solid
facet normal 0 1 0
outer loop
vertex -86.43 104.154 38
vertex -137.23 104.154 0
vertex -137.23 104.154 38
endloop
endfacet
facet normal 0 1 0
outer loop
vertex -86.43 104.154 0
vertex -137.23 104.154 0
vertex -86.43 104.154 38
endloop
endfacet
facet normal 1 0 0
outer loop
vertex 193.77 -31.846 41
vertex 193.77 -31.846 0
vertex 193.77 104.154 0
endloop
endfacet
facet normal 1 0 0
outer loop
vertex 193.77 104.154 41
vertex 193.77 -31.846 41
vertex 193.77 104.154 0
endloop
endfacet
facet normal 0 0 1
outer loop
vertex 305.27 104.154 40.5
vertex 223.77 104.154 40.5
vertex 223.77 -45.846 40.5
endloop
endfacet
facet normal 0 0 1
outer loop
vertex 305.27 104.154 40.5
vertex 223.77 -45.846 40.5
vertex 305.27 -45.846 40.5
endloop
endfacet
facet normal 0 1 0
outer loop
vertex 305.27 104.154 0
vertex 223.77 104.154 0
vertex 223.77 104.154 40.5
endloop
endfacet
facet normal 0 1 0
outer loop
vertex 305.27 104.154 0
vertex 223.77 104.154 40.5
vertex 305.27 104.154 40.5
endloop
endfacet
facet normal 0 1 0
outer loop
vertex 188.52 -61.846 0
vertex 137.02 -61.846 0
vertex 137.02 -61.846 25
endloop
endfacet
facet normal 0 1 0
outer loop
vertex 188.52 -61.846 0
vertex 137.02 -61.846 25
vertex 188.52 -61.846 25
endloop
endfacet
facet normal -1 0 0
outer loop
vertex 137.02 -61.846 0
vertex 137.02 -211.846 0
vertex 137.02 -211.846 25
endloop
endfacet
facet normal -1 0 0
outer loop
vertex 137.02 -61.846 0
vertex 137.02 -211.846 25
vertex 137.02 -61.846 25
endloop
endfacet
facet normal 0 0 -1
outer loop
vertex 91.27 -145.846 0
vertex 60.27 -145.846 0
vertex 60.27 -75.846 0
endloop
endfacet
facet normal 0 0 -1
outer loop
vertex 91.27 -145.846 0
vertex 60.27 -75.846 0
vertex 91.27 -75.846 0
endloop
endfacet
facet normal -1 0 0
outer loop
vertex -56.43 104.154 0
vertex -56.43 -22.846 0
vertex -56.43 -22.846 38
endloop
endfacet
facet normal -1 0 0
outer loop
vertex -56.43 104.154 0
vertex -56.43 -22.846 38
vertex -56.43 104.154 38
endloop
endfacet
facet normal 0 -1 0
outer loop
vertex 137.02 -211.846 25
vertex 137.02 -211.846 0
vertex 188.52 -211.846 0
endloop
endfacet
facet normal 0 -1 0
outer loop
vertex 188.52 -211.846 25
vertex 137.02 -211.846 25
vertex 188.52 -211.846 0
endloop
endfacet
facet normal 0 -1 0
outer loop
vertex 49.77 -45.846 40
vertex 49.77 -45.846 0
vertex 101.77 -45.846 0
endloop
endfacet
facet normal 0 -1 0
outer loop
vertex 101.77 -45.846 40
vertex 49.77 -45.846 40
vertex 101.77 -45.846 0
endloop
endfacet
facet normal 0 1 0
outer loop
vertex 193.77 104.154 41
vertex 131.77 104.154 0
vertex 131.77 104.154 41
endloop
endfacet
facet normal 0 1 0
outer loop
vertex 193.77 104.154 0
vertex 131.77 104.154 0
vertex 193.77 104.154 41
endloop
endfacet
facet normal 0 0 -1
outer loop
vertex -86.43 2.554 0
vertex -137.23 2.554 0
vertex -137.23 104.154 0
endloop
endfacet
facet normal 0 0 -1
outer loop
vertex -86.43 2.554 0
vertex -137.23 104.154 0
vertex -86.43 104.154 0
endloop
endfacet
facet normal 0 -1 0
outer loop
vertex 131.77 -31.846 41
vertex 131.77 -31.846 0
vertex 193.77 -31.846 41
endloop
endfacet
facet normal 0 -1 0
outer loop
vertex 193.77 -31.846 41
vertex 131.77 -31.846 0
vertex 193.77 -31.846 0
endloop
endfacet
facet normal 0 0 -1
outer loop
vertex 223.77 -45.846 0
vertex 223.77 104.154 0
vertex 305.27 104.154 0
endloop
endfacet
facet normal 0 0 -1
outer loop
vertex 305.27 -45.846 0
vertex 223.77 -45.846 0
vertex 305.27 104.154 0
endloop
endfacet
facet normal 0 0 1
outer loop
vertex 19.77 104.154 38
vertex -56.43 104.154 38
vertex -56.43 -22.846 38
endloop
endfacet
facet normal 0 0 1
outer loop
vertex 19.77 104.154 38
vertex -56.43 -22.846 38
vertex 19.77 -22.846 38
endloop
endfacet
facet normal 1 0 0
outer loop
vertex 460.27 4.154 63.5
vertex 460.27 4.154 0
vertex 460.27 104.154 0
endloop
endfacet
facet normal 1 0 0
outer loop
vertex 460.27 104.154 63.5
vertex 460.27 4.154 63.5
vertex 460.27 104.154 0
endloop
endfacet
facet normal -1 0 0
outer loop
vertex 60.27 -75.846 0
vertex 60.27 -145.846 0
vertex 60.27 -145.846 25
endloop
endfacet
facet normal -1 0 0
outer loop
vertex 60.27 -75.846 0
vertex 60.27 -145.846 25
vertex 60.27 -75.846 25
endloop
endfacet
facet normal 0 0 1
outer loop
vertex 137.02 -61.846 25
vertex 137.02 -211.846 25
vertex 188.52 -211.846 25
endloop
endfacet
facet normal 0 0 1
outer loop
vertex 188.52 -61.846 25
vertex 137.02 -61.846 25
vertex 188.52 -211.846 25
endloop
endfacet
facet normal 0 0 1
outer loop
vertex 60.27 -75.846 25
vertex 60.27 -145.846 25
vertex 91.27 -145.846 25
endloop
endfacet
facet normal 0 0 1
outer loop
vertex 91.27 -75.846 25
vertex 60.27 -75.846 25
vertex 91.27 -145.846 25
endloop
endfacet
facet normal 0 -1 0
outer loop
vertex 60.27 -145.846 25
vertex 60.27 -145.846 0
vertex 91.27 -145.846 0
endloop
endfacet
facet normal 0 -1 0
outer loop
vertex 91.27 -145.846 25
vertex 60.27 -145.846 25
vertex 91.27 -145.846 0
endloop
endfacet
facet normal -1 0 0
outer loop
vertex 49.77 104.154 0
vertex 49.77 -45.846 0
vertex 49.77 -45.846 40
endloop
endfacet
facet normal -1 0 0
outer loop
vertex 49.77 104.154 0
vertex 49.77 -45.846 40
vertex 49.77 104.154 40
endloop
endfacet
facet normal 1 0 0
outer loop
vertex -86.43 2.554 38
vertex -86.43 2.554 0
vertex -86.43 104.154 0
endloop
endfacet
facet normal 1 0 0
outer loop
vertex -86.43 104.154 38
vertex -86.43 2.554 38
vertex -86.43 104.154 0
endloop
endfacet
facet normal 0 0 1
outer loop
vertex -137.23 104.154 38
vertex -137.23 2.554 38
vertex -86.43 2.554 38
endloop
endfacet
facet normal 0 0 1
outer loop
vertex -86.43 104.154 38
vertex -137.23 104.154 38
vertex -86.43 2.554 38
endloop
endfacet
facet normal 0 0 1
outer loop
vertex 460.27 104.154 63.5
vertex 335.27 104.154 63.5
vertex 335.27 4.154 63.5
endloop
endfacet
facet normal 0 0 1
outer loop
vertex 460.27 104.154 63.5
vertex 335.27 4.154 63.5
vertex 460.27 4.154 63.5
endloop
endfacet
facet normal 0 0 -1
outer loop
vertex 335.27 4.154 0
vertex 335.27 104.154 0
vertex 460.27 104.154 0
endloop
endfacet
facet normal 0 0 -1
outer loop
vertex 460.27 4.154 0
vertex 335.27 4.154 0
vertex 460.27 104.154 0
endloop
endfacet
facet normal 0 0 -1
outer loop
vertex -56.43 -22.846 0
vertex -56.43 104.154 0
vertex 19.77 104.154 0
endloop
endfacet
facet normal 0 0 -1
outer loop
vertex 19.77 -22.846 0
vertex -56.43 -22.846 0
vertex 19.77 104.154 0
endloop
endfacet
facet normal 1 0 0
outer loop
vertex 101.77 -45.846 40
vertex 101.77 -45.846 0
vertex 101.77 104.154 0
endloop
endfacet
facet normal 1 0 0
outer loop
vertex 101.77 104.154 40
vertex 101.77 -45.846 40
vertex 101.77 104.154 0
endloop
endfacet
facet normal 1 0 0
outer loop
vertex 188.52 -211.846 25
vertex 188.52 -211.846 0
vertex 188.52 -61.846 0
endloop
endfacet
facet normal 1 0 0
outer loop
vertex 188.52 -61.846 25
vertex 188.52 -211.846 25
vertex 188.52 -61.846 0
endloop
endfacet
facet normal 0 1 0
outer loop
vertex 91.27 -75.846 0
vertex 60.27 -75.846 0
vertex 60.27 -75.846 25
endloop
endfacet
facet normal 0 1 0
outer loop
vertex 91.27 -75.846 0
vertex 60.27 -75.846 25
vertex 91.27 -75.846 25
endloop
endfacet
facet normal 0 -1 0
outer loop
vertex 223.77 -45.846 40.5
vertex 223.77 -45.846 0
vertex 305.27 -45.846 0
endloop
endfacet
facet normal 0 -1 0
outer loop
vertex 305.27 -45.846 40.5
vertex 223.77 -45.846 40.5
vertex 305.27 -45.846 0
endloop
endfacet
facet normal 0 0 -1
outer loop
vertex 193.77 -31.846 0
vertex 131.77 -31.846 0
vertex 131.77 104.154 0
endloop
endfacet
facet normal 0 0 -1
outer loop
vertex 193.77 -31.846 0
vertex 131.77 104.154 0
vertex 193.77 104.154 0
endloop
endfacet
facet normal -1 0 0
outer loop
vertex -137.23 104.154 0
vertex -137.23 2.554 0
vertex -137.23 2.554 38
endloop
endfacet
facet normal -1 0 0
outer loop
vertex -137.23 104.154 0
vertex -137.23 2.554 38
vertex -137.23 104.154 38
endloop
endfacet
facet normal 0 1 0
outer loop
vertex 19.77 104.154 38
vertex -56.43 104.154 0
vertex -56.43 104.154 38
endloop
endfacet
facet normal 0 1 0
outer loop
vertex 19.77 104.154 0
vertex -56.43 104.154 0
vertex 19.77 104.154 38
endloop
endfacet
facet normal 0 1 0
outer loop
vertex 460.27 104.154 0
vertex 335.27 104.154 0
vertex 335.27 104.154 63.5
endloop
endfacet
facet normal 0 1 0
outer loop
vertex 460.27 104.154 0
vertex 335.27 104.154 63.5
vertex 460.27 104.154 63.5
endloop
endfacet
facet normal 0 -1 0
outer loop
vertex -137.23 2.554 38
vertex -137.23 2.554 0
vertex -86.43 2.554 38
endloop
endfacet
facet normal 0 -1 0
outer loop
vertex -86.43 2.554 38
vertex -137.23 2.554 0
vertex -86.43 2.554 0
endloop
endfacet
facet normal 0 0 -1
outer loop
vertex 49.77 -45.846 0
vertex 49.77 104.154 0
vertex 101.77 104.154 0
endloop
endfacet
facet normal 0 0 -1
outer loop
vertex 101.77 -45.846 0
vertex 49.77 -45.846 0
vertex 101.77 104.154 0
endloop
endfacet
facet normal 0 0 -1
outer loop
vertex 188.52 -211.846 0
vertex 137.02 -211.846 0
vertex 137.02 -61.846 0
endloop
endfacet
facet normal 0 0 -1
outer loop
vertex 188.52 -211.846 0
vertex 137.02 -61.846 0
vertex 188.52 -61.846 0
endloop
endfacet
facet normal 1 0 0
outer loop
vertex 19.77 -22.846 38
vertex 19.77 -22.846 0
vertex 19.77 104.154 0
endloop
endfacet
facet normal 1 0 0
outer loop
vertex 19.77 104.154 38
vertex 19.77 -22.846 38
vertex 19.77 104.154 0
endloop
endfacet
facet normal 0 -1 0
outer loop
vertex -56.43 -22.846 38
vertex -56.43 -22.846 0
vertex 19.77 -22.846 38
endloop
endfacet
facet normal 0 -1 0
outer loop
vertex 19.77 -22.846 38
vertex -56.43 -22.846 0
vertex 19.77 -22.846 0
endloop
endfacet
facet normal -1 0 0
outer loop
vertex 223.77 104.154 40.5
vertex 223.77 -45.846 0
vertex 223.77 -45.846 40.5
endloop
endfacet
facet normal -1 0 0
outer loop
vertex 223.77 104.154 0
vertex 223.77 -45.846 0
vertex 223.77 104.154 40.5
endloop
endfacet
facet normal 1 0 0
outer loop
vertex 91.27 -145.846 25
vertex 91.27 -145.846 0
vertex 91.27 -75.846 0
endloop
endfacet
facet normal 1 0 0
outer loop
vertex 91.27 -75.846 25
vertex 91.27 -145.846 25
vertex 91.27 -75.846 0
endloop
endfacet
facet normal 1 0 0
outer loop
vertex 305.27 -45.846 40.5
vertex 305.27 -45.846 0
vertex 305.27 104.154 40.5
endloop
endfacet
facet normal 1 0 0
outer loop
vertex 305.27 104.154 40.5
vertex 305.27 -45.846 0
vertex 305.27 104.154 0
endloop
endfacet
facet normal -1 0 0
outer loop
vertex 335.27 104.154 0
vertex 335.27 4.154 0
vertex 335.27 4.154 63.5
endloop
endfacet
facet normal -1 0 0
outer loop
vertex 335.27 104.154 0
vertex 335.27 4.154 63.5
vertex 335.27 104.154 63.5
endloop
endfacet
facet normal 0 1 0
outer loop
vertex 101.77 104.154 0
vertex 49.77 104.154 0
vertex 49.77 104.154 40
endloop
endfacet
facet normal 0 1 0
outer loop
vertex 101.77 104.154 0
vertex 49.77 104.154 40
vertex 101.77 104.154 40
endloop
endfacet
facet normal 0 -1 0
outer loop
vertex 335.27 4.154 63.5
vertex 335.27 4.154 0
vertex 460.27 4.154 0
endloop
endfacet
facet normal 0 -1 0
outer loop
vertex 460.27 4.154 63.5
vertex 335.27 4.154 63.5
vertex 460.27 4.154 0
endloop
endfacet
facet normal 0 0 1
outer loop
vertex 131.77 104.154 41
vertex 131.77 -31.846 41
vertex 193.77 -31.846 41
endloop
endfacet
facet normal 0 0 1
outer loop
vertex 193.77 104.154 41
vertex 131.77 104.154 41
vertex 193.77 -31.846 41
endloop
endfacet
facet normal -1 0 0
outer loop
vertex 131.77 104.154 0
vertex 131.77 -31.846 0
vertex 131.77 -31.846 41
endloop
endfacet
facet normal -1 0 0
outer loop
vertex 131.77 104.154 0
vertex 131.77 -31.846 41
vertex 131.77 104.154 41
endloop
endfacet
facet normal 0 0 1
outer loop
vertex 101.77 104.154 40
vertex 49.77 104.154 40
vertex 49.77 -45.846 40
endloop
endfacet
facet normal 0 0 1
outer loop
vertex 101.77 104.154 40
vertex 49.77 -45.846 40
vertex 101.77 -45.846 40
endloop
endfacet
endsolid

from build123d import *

# Parameters (mm, degrees)
F0_W     = 50.8
F0_H     = 101.6
F0_W_2   = 76.2
F0_H_2   = 127
F1_DEPTH = 38
F0_W_3   = 52
F0_H_3   = 150
F2_DEPTH = 40
F0_W_4   = 81.5
F3_DEPTH = 40.5
F0_W_5   = 125
F0_H_4   = 100
F4_DEPTH = 63.5
F0_W_6   = 31
F0_H_5   = 70
F5_DEPTH = 25
F0_W_7   = 62
F0_H_6   = 136
F6_DEPTH = 41
F0_W_8   = 51.5
F7_DEPTH = 25


with BuildPart() as f1:
    # F0 (on Top) → F1 (new body)
    with BuildSketch(Plane.XY):
        with Locations((-111.830192, 53.35411)):
            Rectangle(F0_W, F0_H)
        with Locations((-18.330192, 40.65411)):
            Rectangle(F0_W_2, F0_H_2)
    extrude(amount=F1_DEPTH)


with BuildPart() as f2:
    # F0 (on Top) → F2 (new body)
    with BuildSketch(Plane.XY):
        with Locations((75.769808, 29.15411)):
            Rectangle(F0_W_3, F0_H_3)
    extrude(amount=F2_DEPTH)


with BuildPart() as f3:
    # F0 (on Top) → F3 (new body)
    with BuildSketch(Plane.XY):
        with Locations((264.519808, 29.15411)):
            Rectangle(F0_W_4, F0_H_3)
    extrude(amount=F3_DEPTH)


with BuildPart() as f4:
    # F0 (on Top) → F4 (new body)
    with BuildSketch(Plane.XY):
        with Locations((397.769808, 54.15411)):
            Rectangle(F0_W_5, F0_H_4)
    extrude(amount=F4_DEPTH)


with BuildPart() as f5:
    # F0 (on Top) → F5 (new body)
    with BuildSketch(Plane.XY):
        with Locations((75.769808, -110.84589)):
            Rectangle(F0_W_6, F0_H_5)
    extrude(amount=F5_DEPTH)


with BuildPart() as f6:
    # F0 (on Top) → F6 (new body)
    with BuildSketch(Plane.XY):
        with Locations((162.769808, 36.15411)):
            Rectangle(F0_W_7, F0_H_6)
    extrude(amount=F6_DEPTH)


with BuildPart() as f7:
    # F0 (on Top) → F7 (new body)
    with BuildSketch(Plane.XY):
        with Locations((162.769808, -136.84589)):
            Rectangle(F0_W_8, F0_H_3)
    extrude(amount=F7_DEPTH)


solid = Compound([f1.part, f2.part, f3.part, f4.part, f5.part, f6.part, f7.part])
